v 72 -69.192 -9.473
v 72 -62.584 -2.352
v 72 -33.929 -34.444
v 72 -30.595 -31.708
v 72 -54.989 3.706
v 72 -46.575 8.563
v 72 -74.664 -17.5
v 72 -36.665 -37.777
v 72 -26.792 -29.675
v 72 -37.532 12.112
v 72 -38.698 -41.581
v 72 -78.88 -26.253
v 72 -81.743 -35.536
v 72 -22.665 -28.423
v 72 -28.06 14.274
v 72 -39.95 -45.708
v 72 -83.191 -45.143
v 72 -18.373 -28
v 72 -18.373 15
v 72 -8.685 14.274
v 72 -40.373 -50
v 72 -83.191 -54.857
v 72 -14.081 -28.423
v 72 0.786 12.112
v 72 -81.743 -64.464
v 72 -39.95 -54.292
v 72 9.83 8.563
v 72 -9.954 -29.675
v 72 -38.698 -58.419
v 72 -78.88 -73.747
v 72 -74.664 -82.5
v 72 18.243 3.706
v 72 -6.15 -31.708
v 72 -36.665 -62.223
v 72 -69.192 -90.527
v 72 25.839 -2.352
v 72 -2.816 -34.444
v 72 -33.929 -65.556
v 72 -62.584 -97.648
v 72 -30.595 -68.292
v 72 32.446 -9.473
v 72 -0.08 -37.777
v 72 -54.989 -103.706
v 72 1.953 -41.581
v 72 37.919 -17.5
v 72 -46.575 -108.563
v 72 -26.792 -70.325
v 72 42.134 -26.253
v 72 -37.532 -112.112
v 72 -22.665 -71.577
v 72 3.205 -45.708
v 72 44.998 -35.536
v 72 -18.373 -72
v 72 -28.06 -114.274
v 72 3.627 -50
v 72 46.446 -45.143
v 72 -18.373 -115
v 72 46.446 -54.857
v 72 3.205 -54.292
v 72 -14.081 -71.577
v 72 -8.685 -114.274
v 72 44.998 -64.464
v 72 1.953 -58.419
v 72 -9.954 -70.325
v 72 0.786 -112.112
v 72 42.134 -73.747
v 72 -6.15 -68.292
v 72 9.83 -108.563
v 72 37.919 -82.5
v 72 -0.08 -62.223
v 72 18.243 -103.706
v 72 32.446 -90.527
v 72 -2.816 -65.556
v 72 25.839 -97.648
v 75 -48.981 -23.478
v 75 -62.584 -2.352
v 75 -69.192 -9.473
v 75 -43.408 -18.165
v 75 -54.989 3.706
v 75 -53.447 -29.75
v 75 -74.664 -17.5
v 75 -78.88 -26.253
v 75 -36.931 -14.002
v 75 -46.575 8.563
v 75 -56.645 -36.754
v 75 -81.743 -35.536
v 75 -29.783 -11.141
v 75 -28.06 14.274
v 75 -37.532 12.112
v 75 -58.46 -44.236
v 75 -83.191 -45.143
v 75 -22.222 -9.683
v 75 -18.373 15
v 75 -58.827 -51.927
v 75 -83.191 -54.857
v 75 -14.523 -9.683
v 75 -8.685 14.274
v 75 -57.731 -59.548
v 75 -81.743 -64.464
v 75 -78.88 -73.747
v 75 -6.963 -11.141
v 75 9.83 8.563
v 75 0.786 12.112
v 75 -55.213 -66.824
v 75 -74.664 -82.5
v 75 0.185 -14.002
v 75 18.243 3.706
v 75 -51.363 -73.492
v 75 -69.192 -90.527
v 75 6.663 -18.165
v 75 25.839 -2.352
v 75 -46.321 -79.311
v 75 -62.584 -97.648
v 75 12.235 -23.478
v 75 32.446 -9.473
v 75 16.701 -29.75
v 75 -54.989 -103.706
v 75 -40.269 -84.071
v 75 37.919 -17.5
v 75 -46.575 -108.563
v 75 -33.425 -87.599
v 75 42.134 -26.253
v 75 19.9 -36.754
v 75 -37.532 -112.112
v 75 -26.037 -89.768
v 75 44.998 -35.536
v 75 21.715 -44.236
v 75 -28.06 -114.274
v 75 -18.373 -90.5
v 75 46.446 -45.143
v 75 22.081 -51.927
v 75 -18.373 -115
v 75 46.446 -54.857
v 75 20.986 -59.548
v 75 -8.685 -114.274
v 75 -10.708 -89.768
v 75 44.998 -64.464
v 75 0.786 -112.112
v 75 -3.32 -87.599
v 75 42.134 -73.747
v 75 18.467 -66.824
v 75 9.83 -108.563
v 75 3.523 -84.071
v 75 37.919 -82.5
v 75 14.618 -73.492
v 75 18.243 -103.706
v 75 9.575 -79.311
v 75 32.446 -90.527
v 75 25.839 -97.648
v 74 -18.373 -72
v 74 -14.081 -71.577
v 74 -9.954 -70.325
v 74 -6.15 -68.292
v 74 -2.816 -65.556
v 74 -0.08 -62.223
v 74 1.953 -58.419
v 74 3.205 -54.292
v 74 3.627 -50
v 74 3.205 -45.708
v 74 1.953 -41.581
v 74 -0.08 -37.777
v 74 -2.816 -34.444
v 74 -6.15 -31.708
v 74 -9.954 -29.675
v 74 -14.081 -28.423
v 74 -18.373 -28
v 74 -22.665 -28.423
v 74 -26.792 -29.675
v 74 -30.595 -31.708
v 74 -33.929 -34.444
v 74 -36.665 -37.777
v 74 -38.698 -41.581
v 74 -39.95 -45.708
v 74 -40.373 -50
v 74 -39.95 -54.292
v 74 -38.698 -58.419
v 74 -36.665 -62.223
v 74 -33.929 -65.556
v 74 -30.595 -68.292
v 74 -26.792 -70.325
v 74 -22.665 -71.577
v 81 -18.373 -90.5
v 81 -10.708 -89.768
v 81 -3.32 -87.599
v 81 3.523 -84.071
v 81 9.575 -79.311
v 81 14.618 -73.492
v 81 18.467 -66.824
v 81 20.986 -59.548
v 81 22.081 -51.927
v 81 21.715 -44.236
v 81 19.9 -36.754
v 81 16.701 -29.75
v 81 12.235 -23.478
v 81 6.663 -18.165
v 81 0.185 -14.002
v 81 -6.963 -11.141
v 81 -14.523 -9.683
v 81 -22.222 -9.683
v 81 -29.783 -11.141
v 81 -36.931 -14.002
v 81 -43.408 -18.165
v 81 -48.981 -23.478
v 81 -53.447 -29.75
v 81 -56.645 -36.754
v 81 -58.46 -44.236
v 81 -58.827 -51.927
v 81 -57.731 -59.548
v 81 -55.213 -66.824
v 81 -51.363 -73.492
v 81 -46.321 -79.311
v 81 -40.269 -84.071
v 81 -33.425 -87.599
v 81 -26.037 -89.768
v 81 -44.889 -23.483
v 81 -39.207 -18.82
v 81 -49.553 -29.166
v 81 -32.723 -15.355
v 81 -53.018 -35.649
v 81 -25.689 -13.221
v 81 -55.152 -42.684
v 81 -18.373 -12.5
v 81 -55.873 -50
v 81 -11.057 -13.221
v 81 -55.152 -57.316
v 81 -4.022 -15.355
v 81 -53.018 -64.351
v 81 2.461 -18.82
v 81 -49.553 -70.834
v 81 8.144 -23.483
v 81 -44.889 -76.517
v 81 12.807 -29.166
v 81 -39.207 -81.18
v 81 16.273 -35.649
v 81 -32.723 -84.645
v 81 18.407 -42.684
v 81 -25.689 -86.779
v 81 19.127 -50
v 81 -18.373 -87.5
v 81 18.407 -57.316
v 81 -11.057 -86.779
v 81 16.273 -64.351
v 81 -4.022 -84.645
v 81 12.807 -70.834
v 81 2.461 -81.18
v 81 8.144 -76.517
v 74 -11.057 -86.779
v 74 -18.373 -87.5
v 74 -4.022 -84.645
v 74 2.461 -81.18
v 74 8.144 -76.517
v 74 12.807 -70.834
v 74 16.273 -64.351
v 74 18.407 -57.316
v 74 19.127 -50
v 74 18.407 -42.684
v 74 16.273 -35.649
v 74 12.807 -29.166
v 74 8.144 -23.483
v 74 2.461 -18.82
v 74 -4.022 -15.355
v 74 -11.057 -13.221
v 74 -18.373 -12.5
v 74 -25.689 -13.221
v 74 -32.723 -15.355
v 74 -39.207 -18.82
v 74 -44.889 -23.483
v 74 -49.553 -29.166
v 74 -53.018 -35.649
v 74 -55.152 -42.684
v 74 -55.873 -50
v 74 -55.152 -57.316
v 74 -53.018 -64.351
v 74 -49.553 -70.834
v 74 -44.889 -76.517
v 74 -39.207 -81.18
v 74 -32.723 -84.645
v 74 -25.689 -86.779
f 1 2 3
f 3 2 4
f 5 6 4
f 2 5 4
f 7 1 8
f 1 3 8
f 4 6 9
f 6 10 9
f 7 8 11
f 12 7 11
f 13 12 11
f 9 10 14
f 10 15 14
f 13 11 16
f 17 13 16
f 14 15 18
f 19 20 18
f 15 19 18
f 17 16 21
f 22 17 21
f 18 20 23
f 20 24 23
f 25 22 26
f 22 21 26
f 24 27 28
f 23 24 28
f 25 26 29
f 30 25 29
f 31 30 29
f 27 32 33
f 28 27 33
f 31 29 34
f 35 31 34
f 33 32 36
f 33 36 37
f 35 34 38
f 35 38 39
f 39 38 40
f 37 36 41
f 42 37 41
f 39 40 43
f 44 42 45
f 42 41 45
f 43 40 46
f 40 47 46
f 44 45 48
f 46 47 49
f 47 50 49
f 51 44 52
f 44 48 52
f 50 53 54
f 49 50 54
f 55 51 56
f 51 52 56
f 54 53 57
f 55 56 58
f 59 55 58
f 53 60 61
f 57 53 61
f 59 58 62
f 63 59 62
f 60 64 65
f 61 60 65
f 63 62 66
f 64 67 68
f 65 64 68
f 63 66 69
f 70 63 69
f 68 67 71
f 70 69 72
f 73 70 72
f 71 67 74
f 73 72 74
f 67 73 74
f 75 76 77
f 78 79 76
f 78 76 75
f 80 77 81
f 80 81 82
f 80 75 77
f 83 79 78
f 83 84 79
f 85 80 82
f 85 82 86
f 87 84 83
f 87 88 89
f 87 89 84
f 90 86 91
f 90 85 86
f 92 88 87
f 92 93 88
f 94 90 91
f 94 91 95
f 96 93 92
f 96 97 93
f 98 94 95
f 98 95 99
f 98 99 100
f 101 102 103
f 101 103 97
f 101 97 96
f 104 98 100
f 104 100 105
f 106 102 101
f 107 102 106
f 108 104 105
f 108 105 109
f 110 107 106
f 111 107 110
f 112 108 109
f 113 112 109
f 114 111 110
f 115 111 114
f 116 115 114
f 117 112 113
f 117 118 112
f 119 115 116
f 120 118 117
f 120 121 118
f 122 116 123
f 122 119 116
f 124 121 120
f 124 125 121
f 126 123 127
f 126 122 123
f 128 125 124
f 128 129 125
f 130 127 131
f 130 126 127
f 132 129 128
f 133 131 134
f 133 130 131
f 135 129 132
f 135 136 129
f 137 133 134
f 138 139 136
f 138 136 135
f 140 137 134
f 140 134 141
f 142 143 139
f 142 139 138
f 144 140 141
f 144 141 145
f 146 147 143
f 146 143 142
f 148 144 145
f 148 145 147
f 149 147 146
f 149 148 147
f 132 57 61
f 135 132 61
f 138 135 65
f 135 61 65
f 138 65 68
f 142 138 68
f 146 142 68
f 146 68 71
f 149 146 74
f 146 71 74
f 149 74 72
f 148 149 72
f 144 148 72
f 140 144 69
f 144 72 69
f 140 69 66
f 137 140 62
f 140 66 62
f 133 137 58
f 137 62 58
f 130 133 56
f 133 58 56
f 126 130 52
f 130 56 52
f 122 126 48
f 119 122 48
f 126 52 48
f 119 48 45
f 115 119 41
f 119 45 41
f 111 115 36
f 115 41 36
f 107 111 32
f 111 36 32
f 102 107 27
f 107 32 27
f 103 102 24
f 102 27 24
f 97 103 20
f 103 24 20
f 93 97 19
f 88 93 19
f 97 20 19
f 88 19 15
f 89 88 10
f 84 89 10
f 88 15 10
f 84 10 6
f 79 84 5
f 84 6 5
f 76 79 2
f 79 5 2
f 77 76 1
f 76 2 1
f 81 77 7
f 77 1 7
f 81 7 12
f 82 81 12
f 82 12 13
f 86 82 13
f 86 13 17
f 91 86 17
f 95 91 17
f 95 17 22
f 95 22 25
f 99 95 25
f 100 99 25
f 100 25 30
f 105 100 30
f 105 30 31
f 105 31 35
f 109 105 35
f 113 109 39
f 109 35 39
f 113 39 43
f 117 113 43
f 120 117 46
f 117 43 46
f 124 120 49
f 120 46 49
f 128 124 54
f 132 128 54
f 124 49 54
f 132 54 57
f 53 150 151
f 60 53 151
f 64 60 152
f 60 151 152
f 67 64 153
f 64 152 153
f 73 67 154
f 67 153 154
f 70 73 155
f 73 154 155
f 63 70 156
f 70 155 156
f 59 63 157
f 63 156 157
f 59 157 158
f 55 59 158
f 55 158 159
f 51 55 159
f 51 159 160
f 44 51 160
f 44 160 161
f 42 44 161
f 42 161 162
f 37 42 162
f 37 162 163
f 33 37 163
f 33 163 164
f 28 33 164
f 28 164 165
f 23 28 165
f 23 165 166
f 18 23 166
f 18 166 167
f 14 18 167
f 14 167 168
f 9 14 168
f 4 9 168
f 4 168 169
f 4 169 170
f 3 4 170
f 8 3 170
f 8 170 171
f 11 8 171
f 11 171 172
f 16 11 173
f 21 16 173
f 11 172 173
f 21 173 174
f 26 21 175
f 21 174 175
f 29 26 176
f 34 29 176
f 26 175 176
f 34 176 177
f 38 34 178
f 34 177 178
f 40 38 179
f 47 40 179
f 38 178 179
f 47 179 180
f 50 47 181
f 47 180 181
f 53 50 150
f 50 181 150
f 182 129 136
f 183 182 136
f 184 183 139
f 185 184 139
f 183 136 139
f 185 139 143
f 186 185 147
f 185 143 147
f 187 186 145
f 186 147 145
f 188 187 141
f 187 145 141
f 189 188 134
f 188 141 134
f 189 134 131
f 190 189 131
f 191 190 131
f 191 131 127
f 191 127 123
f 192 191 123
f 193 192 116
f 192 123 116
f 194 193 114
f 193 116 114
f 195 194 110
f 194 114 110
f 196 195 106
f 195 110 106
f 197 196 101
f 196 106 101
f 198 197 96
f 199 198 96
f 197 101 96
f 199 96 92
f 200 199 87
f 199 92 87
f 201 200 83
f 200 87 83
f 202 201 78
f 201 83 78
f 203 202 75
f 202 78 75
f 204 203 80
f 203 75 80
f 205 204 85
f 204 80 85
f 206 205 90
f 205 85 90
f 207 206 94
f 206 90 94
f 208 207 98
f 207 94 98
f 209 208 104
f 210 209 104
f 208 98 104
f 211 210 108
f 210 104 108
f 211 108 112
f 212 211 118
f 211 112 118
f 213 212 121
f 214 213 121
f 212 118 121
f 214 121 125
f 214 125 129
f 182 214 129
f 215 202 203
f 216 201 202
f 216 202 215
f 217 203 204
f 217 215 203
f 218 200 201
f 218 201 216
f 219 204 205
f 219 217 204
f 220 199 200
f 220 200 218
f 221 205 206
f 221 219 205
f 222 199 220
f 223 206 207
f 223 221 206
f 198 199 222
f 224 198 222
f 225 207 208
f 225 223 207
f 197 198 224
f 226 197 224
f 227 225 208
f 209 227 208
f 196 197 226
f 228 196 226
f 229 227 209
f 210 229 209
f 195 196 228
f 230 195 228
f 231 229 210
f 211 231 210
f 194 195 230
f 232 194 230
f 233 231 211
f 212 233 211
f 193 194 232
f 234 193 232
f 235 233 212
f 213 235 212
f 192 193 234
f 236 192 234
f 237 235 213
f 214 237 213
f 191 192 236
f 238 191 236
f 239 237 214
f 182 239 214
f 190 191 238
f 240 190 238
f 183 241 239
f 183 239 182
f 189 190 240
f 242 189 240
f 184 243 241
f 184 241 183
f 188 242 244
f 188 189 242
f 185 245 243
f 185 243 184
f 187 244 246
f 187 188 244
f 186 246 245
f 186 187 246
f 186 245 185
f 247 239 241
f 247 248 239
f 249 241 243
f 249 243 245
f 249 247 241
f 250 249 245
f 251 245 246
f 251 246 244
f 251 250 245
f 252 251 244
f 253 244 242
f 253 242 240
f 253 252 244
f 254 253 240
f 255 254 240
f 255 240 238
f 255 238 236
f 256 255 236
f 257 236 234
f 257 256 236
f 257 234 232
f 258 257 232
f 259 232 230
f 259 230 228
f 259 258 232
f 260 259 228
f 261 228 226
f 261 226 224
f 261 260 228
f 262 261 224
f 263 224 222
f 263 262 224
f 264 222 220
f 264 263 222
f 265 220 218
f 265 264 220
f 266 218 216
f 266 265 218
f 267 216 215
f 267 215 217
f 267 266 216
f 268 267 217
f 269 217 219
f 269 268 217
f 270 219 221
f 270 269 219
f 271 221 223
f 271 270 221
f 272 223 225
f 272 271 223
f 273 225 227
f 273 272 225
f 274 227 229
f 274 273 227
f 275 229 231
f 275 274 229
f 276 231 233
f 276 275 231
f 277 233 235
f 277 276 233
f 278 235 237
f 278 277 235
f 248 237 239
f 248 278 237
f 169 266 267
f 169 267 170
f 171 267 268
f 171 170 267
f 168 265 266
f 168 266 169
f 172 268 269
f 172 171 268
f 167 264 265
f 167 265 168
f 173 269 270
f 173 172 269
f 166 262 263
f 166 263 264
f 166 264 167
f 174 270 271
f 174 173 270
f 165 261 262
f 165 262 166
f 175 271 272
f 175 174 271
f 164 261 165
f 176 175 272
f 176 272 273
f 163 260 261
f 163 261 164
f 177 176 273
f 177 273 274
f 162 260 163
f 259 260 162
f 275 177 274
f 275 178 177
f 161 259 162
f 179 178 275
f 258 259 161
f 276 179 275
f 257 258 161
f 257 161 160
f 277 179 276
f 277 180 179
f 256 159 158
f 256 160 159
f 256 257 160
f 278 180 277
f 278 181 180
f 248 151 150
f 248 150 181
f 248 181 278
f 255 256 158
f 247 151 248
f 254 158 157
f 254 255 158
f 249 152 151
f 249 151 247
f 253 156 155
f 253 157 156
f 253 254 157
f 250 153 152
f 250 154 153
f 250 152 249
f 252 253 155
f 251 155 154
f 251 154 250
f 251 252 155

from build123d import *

# Parameters (mm, degrees)
SKETCH1_R               = 65
BULK_EXTRUDE_DEPTH      = 3
SKETCH2_R               = 40.5
SKETCH2_R_2             = 37.5
BEARING_RING_DEPTH      = 6
BEARING_START           = -1
SKETCH4_R               = 37.5
BEARING_CUT_DEPTH       = 1
SKETCH5_R               = 22
WIRE_PASSTHRU_CUT_DEPTH = 143.214667503


with BuildPart() as part:
    # Sketch1 → BULK EXTRUDE (new body)
    with BuildSketch(Plane(origin=(72, 0, 0), x_dir=(0, 0, -1), z_dir=(1, 0, 0))):
        with Locations((50, -18.372727273)):
            Circle(SKETCH1_R)
    extrude(amount=BULK_EXTRUDE_DEPTH)

    # Sketch2 → BEARING RING (add)
    with BuildSketch(Plane(origin=(75, 0, 0), x_dir=(0, 0, -1), z_dir=(1, 0, 0))):
        with Locations((50, -18.372727273)):
            Circle(SKETCH2_R)
        with Locations((50, -18.372727273)):
            Circle(SKETCH2_R_2, mode=Mode.SUBTRACT)
    extrude(amount=BEARING_RING_DEPTH)

    # Sketch4 → BEARING CUT (cut)
    with BuildSketch(Plane(origin=(75, 0, 0), x_dir=(0, 0, -1), z_dir=(1, 0, 0)).offset(BEARING_START)):
        with Locations((50, -18.372727273)):
            Circle(SKETCH4_R)
    extrude(amount=BEARING_CUT_DEPTH, mode=Mode.SUBTRACT)

    # Sketch5 → WIRE PASSTHRU CUT (cut, through all)
    with BuildSketch(Plane(origin=(74, 0, 0), x_dir=(0, 0, -1), z_dir=(1, 0, 0))):
        with Locations((50, -18.372727273)):
            Circle(SKETCH5_R)
    extrude(amount=-WIRE_PASSTHRU_CUT_DEPTH, mode=Mode.SUBTRACT)


solid = part.part
